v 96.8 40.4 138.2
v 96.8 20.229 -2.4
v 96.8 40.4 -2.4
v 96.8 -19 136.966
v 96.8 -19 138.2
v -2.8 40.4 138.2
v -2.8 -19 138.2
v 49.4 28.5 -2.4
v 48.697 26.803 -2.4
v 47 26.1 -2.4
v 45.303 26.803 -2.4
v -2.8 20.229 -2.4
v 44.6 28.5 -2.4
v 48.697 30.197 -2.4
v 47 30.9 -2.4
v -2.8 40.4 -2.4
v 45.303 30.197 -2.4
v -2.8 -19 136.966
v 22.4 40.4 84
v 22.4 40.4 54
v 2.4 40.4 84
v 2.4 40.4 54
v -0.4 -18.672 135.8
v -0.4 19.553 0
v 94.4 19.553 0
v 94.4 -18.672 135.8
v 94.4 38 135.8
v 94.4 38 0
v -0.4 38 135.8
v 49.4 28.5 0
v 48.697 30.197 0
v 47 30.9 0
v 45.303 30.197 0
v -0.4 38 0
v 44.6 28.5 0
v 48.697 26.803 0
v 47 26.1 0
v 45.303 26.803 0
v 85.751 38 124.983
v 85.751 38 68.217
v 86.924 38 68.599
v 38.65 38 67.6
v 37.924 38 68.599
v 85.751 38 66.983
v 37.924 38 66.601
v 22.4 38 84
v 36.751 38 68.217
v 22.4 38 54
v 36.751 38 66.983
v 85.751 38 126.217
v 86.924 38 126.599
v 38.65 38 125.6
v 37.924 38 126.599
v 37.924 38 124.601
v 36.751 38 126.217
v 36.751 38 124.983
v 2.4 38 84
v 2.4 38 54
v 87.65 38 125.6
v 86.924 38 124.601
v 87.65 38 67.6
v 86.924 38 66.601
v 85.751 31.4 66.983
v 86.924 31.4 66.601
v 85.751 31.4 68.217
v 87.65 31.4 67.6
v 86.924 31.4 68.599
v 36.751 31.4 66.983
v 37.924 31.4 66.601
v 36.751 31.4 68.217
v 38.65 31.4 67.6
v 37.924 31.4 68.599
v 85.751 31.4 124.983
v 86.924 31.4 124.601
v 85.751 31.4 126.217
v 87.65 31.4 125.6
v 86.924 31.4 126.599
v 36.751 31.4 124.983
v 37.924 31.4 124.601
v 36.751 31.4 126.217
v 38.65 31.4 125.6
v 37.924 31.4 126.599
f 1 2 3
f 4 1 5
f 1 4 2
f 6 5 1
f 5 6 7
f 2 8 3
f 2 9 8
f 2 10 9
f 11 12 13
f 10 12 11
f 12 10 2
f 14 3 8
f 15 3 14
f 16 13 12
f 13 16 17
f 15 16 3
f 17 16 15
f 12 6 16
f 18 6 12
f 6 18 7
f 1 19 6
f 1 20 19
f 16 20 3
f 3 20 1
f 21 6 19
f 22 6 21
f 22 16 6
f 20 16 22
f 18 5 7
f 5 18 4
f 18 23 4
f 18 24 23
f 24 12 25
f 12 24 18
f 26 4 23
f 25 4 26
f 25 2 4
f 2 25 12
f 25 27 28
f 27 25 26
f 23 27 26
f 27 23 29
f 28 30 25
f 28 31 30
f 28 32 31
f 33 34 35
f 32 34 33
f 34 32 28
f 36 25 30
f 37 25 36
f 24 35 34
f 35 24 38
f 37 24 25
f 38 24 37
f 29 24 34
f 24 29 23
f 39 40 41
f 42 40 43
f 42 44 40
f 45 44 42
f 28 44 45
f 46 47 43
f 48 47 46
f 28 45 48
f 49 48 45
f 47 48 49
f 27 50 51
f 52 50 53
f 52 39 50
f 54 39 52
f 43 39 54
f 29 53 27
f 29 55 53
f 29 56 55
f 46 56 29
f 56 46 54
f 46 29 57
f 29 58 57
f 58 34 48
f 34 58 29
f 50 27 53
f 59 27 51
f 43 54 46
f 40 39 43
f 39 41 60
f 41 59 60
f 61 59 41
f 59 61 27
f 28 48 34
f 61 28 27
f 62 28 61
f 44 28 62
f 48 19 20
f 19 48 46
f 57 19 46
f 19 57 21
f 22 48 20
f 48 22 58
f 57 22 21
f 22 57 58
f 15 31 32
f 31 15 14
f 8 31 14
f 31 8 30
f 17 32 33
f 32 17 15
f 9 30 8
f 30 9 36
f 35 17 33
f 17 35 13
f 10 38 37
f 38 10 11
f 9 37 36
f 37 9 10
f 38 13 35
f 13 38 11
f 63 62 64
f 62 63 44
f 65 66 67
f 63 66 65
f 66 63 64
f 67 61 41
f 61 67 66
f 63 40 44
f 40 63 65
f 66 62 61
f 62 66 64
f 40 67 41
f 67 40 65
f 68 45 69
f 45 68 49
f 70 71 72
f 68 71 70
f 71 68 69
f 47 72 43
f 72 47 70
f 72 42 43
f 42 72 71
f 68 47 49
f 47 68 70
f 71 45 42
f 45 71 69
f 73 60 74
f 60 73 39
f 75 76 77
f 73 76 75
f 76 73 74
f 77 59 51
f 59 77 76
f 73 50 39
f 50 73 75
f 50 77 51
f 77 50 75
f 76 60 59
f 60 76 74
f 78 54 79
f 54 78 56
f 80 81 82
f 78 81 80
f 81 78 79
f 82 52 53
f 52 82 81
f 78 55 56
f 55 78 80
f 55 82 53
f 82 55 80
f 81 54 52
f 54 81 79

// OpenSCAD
// file: variables.scad
// Size are in millimeters
margin = 0.4;

height = 135;   // z axis
width = 94;     // x axis
depth = 38;      // y axis
thickness = 2.4;
cam_diameter = 15;
button_diameter = 24.2;
speaker_diameter = 28 + margin;
micro_diameter = 6 + margin;
name = "DOORBELL";

// Only for client
client_height = 125;   // z axis
client_width = 165;     // x axis
client_depth = 35;      // y axis
screen_width = 118.5;
screen_height = 70.4;   // Diff 5.5mm from pcb top to screen top
screen_pcb_height = 78;
screen_pcb_depth = 9;
// main file
include <variables.scad>;

// Back
difference () {
    translate ([-margin - thickness, - 0.5*depth, - thickness]) 
        cube ([width + 2*margin + 2*thickness, 1.5*depth + thickness, height + 2*margin + 2*thickness]);
    // Cut cube
    translate([-0.5*width, -depth-thickness ,-0.5*height])
        rotate([atan(depth/height),0,0])
        cube ([2*width, 2*depth, 2*height]);    
    // Remove place for face
    translate ([-margin, -depth, 0]) cube ([width+2*margin, 2*depth, height + 2*margin]);
    // Hole for wires
    translate ([thickness, depth-0.5*thickness, 0.4 * height]) cube ([20, 2*thickness, 30]);
    // Screw hole
    translate ([0.5 * width, 0.75 * depth, -thickness-margin]) cylinder (h = 2*thickness, r = thickness);
};

// Support for rpi
rpi_sup_w = 49;
rpi_sup_h = 58;
rpi_sup_d = 2.1;
rpi_sup_l = 7;

module support () { rotate ([90,0,0]) cylinder (h = rpi_sup_l, r = rpi_sup_d / 2); };
translate ([width - rpi_sup_w - thickness - 5, depth + margin, height - rpi_sup_h - thickness - 7]) {
    translate ([rpi_sup_w,0,0]) support();
    translate ([0,0,0]) support();
    translate ([rpi_sup_w,0,rpi_sup_h]) support();
    translate ([0,0,rpi_sup_h]) support();
};
